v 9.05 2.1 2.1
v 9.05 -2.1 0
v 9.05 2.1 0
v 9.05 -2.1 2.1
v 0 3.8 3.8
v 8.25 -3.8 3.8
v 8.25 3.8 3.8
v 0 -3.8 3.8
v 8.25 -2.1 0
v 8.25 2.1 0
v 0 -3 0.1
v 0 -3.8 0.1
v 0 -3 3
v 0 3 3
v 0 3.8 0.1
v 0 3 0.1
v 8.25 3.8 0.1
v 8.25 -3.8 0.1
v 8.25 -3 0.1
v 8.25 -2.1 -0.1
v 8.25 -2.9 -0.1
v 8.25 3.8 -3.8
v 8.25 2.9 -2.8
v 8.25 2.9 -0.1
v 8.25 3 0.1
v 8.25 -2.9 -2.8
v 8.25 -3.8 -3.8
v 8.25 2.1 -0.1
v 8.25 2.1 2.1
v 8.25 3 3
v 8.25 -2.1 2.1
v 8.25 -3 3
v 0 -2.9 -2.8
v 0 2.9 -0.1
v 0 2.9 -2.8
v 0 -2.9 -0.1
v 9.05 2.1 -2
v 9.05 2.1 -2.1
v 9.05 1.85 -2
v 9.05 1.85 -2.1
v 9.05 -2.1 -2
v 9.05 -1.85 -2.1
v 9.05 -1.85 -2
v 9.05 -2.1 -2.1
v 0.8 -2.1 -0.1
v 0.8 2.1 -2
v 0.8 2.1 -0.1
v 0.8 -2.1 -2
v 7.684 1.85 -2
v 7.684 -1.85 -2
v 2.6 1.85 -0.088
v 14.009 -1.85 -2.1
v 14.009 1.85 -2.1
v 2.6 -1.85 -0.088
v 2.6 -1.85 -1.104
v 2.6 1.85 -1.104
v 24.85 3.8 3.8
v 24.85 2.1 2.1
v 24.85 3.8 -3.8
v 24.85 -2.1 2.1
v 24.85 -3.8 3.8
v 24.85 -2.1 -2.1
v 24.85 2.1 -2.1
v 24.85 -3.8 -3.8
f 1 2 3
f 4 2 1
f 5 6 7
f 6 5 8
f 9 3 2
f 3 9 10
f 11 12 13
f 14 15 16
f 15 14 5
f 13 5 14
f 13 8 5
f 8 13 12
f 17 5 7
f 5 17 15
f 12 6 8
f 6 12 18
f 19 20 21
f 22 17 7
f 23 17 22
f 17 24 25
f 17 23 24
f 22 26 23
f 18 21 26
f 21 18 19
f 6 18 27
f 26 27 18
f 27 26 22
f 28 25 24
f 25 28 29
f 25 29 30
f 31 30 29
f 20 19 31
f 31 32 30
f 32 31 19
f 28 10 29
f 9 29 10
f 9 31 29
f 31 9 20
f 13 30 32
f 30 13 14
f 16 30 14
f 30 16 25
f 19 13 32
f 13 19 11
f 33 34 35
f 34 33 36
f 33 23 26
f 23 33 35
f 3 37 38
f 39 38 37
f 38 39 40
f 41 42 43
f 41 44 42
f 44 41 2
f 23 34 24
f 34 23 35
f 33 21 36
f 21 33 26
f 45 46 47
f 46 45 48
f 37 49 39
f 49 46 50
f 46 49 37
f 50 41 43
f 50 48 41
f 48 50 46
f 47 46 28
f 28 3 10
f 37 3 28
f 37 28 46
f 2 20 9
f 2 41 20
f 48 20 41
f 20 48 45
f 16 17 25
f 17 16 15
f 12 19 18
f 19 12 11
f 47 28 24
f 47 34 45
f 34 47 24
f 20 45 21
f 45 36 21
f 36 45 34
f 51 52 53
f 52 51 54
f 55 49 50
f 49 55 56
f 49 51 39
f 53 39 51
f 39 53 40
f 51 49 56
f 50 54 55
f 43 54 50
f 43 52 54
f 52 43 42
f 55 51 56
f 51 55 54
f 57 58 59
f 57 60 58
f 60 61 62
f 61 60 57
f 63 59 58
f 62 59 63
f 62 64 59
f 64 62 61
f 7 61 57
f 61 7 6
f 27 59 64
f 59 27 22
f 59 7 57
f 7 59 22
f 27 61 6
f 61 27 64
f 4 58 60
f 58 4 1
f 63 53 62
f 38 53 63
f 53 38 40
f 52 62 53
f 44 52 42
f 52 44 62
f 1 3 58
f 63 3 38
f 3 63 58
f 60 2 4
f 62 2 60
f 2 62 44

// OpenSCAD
// CSG.scad - Basic example of CSG usage

thinwall=0.8;
backwall=1.7;
cupdepth=8.25;
cupwidth=7.6;
margin=0.2;
tongue_angle=10;
tongue_thickness=1;
tongue_rise=12.5;
tongue_depth=2.6; // From connector tip to tongue tip
tongue_width=3.7; // On y axis

// Square pipe, from origo
module sqpipe(d, w, h, wall) {
    difference() {
        cube([d,w,h]);
        translate([-wall,wall,wall]) {
            cube([d+2*wall,w-2*wall,h-2*wall]);
        }
    }
}

// PowerPolish contact cup, centered on y axis and nudged on z axis
module poletip(d, w, h, wall) {
    difference() {
        // Outer
        translate([0,-w/2,0]) {
            cube([d,w,h]);
        }
        // Inner
        translate([-thinwall,-w/2+wall,-wall]) {
            cube([d,w-2*wall,h]);
        }
    }
}

module pole(backdepth=16.6) {
    // Front part
    difference() {
        union() {
            // Upper part
            poletip(cupdepth+thinwall, cupwidth, cupwidth/2, thinwall);
            // Lower part
            rotate([180,0,180]) {
                translate([-(cupdepth+thinwall),0,0]) {
                    poletip(cupdepth+thinwall, cupwidth-2*thinwall-margin, cupwidth/2-thinwall-margin, thinwall);
                }
            }
        }
        cube([2*cupdepth,cupwidth+margin,margin], center=true);
    }

    translate([tongue_rise+tongue_depth,0,-cupwidth/2+thinwall+margin]) {
        tongue(tongue_angle, tongue_width, tongue_rise, tongue_thickness);
    }

    // Back part
    translate([cupdepth,-cupwidth/2,-cupwidth/2]) {
        sqpipe(backdepth, cupwidth, cupwidth, backwall);
    }
}

module tongue( angle, width, length, thickness) {
    intersection () {
        difference() {
            rotate([0,angle,0]) {
                cube([3*length,width,thickness], center=true);
            }
            translate([0,0,-length]) {
                cube([3*length,width*2,2*length], center=true);
            }
        }
        cube([2*length, 2*width, length*2], center=true); 
    }
}

pole();
